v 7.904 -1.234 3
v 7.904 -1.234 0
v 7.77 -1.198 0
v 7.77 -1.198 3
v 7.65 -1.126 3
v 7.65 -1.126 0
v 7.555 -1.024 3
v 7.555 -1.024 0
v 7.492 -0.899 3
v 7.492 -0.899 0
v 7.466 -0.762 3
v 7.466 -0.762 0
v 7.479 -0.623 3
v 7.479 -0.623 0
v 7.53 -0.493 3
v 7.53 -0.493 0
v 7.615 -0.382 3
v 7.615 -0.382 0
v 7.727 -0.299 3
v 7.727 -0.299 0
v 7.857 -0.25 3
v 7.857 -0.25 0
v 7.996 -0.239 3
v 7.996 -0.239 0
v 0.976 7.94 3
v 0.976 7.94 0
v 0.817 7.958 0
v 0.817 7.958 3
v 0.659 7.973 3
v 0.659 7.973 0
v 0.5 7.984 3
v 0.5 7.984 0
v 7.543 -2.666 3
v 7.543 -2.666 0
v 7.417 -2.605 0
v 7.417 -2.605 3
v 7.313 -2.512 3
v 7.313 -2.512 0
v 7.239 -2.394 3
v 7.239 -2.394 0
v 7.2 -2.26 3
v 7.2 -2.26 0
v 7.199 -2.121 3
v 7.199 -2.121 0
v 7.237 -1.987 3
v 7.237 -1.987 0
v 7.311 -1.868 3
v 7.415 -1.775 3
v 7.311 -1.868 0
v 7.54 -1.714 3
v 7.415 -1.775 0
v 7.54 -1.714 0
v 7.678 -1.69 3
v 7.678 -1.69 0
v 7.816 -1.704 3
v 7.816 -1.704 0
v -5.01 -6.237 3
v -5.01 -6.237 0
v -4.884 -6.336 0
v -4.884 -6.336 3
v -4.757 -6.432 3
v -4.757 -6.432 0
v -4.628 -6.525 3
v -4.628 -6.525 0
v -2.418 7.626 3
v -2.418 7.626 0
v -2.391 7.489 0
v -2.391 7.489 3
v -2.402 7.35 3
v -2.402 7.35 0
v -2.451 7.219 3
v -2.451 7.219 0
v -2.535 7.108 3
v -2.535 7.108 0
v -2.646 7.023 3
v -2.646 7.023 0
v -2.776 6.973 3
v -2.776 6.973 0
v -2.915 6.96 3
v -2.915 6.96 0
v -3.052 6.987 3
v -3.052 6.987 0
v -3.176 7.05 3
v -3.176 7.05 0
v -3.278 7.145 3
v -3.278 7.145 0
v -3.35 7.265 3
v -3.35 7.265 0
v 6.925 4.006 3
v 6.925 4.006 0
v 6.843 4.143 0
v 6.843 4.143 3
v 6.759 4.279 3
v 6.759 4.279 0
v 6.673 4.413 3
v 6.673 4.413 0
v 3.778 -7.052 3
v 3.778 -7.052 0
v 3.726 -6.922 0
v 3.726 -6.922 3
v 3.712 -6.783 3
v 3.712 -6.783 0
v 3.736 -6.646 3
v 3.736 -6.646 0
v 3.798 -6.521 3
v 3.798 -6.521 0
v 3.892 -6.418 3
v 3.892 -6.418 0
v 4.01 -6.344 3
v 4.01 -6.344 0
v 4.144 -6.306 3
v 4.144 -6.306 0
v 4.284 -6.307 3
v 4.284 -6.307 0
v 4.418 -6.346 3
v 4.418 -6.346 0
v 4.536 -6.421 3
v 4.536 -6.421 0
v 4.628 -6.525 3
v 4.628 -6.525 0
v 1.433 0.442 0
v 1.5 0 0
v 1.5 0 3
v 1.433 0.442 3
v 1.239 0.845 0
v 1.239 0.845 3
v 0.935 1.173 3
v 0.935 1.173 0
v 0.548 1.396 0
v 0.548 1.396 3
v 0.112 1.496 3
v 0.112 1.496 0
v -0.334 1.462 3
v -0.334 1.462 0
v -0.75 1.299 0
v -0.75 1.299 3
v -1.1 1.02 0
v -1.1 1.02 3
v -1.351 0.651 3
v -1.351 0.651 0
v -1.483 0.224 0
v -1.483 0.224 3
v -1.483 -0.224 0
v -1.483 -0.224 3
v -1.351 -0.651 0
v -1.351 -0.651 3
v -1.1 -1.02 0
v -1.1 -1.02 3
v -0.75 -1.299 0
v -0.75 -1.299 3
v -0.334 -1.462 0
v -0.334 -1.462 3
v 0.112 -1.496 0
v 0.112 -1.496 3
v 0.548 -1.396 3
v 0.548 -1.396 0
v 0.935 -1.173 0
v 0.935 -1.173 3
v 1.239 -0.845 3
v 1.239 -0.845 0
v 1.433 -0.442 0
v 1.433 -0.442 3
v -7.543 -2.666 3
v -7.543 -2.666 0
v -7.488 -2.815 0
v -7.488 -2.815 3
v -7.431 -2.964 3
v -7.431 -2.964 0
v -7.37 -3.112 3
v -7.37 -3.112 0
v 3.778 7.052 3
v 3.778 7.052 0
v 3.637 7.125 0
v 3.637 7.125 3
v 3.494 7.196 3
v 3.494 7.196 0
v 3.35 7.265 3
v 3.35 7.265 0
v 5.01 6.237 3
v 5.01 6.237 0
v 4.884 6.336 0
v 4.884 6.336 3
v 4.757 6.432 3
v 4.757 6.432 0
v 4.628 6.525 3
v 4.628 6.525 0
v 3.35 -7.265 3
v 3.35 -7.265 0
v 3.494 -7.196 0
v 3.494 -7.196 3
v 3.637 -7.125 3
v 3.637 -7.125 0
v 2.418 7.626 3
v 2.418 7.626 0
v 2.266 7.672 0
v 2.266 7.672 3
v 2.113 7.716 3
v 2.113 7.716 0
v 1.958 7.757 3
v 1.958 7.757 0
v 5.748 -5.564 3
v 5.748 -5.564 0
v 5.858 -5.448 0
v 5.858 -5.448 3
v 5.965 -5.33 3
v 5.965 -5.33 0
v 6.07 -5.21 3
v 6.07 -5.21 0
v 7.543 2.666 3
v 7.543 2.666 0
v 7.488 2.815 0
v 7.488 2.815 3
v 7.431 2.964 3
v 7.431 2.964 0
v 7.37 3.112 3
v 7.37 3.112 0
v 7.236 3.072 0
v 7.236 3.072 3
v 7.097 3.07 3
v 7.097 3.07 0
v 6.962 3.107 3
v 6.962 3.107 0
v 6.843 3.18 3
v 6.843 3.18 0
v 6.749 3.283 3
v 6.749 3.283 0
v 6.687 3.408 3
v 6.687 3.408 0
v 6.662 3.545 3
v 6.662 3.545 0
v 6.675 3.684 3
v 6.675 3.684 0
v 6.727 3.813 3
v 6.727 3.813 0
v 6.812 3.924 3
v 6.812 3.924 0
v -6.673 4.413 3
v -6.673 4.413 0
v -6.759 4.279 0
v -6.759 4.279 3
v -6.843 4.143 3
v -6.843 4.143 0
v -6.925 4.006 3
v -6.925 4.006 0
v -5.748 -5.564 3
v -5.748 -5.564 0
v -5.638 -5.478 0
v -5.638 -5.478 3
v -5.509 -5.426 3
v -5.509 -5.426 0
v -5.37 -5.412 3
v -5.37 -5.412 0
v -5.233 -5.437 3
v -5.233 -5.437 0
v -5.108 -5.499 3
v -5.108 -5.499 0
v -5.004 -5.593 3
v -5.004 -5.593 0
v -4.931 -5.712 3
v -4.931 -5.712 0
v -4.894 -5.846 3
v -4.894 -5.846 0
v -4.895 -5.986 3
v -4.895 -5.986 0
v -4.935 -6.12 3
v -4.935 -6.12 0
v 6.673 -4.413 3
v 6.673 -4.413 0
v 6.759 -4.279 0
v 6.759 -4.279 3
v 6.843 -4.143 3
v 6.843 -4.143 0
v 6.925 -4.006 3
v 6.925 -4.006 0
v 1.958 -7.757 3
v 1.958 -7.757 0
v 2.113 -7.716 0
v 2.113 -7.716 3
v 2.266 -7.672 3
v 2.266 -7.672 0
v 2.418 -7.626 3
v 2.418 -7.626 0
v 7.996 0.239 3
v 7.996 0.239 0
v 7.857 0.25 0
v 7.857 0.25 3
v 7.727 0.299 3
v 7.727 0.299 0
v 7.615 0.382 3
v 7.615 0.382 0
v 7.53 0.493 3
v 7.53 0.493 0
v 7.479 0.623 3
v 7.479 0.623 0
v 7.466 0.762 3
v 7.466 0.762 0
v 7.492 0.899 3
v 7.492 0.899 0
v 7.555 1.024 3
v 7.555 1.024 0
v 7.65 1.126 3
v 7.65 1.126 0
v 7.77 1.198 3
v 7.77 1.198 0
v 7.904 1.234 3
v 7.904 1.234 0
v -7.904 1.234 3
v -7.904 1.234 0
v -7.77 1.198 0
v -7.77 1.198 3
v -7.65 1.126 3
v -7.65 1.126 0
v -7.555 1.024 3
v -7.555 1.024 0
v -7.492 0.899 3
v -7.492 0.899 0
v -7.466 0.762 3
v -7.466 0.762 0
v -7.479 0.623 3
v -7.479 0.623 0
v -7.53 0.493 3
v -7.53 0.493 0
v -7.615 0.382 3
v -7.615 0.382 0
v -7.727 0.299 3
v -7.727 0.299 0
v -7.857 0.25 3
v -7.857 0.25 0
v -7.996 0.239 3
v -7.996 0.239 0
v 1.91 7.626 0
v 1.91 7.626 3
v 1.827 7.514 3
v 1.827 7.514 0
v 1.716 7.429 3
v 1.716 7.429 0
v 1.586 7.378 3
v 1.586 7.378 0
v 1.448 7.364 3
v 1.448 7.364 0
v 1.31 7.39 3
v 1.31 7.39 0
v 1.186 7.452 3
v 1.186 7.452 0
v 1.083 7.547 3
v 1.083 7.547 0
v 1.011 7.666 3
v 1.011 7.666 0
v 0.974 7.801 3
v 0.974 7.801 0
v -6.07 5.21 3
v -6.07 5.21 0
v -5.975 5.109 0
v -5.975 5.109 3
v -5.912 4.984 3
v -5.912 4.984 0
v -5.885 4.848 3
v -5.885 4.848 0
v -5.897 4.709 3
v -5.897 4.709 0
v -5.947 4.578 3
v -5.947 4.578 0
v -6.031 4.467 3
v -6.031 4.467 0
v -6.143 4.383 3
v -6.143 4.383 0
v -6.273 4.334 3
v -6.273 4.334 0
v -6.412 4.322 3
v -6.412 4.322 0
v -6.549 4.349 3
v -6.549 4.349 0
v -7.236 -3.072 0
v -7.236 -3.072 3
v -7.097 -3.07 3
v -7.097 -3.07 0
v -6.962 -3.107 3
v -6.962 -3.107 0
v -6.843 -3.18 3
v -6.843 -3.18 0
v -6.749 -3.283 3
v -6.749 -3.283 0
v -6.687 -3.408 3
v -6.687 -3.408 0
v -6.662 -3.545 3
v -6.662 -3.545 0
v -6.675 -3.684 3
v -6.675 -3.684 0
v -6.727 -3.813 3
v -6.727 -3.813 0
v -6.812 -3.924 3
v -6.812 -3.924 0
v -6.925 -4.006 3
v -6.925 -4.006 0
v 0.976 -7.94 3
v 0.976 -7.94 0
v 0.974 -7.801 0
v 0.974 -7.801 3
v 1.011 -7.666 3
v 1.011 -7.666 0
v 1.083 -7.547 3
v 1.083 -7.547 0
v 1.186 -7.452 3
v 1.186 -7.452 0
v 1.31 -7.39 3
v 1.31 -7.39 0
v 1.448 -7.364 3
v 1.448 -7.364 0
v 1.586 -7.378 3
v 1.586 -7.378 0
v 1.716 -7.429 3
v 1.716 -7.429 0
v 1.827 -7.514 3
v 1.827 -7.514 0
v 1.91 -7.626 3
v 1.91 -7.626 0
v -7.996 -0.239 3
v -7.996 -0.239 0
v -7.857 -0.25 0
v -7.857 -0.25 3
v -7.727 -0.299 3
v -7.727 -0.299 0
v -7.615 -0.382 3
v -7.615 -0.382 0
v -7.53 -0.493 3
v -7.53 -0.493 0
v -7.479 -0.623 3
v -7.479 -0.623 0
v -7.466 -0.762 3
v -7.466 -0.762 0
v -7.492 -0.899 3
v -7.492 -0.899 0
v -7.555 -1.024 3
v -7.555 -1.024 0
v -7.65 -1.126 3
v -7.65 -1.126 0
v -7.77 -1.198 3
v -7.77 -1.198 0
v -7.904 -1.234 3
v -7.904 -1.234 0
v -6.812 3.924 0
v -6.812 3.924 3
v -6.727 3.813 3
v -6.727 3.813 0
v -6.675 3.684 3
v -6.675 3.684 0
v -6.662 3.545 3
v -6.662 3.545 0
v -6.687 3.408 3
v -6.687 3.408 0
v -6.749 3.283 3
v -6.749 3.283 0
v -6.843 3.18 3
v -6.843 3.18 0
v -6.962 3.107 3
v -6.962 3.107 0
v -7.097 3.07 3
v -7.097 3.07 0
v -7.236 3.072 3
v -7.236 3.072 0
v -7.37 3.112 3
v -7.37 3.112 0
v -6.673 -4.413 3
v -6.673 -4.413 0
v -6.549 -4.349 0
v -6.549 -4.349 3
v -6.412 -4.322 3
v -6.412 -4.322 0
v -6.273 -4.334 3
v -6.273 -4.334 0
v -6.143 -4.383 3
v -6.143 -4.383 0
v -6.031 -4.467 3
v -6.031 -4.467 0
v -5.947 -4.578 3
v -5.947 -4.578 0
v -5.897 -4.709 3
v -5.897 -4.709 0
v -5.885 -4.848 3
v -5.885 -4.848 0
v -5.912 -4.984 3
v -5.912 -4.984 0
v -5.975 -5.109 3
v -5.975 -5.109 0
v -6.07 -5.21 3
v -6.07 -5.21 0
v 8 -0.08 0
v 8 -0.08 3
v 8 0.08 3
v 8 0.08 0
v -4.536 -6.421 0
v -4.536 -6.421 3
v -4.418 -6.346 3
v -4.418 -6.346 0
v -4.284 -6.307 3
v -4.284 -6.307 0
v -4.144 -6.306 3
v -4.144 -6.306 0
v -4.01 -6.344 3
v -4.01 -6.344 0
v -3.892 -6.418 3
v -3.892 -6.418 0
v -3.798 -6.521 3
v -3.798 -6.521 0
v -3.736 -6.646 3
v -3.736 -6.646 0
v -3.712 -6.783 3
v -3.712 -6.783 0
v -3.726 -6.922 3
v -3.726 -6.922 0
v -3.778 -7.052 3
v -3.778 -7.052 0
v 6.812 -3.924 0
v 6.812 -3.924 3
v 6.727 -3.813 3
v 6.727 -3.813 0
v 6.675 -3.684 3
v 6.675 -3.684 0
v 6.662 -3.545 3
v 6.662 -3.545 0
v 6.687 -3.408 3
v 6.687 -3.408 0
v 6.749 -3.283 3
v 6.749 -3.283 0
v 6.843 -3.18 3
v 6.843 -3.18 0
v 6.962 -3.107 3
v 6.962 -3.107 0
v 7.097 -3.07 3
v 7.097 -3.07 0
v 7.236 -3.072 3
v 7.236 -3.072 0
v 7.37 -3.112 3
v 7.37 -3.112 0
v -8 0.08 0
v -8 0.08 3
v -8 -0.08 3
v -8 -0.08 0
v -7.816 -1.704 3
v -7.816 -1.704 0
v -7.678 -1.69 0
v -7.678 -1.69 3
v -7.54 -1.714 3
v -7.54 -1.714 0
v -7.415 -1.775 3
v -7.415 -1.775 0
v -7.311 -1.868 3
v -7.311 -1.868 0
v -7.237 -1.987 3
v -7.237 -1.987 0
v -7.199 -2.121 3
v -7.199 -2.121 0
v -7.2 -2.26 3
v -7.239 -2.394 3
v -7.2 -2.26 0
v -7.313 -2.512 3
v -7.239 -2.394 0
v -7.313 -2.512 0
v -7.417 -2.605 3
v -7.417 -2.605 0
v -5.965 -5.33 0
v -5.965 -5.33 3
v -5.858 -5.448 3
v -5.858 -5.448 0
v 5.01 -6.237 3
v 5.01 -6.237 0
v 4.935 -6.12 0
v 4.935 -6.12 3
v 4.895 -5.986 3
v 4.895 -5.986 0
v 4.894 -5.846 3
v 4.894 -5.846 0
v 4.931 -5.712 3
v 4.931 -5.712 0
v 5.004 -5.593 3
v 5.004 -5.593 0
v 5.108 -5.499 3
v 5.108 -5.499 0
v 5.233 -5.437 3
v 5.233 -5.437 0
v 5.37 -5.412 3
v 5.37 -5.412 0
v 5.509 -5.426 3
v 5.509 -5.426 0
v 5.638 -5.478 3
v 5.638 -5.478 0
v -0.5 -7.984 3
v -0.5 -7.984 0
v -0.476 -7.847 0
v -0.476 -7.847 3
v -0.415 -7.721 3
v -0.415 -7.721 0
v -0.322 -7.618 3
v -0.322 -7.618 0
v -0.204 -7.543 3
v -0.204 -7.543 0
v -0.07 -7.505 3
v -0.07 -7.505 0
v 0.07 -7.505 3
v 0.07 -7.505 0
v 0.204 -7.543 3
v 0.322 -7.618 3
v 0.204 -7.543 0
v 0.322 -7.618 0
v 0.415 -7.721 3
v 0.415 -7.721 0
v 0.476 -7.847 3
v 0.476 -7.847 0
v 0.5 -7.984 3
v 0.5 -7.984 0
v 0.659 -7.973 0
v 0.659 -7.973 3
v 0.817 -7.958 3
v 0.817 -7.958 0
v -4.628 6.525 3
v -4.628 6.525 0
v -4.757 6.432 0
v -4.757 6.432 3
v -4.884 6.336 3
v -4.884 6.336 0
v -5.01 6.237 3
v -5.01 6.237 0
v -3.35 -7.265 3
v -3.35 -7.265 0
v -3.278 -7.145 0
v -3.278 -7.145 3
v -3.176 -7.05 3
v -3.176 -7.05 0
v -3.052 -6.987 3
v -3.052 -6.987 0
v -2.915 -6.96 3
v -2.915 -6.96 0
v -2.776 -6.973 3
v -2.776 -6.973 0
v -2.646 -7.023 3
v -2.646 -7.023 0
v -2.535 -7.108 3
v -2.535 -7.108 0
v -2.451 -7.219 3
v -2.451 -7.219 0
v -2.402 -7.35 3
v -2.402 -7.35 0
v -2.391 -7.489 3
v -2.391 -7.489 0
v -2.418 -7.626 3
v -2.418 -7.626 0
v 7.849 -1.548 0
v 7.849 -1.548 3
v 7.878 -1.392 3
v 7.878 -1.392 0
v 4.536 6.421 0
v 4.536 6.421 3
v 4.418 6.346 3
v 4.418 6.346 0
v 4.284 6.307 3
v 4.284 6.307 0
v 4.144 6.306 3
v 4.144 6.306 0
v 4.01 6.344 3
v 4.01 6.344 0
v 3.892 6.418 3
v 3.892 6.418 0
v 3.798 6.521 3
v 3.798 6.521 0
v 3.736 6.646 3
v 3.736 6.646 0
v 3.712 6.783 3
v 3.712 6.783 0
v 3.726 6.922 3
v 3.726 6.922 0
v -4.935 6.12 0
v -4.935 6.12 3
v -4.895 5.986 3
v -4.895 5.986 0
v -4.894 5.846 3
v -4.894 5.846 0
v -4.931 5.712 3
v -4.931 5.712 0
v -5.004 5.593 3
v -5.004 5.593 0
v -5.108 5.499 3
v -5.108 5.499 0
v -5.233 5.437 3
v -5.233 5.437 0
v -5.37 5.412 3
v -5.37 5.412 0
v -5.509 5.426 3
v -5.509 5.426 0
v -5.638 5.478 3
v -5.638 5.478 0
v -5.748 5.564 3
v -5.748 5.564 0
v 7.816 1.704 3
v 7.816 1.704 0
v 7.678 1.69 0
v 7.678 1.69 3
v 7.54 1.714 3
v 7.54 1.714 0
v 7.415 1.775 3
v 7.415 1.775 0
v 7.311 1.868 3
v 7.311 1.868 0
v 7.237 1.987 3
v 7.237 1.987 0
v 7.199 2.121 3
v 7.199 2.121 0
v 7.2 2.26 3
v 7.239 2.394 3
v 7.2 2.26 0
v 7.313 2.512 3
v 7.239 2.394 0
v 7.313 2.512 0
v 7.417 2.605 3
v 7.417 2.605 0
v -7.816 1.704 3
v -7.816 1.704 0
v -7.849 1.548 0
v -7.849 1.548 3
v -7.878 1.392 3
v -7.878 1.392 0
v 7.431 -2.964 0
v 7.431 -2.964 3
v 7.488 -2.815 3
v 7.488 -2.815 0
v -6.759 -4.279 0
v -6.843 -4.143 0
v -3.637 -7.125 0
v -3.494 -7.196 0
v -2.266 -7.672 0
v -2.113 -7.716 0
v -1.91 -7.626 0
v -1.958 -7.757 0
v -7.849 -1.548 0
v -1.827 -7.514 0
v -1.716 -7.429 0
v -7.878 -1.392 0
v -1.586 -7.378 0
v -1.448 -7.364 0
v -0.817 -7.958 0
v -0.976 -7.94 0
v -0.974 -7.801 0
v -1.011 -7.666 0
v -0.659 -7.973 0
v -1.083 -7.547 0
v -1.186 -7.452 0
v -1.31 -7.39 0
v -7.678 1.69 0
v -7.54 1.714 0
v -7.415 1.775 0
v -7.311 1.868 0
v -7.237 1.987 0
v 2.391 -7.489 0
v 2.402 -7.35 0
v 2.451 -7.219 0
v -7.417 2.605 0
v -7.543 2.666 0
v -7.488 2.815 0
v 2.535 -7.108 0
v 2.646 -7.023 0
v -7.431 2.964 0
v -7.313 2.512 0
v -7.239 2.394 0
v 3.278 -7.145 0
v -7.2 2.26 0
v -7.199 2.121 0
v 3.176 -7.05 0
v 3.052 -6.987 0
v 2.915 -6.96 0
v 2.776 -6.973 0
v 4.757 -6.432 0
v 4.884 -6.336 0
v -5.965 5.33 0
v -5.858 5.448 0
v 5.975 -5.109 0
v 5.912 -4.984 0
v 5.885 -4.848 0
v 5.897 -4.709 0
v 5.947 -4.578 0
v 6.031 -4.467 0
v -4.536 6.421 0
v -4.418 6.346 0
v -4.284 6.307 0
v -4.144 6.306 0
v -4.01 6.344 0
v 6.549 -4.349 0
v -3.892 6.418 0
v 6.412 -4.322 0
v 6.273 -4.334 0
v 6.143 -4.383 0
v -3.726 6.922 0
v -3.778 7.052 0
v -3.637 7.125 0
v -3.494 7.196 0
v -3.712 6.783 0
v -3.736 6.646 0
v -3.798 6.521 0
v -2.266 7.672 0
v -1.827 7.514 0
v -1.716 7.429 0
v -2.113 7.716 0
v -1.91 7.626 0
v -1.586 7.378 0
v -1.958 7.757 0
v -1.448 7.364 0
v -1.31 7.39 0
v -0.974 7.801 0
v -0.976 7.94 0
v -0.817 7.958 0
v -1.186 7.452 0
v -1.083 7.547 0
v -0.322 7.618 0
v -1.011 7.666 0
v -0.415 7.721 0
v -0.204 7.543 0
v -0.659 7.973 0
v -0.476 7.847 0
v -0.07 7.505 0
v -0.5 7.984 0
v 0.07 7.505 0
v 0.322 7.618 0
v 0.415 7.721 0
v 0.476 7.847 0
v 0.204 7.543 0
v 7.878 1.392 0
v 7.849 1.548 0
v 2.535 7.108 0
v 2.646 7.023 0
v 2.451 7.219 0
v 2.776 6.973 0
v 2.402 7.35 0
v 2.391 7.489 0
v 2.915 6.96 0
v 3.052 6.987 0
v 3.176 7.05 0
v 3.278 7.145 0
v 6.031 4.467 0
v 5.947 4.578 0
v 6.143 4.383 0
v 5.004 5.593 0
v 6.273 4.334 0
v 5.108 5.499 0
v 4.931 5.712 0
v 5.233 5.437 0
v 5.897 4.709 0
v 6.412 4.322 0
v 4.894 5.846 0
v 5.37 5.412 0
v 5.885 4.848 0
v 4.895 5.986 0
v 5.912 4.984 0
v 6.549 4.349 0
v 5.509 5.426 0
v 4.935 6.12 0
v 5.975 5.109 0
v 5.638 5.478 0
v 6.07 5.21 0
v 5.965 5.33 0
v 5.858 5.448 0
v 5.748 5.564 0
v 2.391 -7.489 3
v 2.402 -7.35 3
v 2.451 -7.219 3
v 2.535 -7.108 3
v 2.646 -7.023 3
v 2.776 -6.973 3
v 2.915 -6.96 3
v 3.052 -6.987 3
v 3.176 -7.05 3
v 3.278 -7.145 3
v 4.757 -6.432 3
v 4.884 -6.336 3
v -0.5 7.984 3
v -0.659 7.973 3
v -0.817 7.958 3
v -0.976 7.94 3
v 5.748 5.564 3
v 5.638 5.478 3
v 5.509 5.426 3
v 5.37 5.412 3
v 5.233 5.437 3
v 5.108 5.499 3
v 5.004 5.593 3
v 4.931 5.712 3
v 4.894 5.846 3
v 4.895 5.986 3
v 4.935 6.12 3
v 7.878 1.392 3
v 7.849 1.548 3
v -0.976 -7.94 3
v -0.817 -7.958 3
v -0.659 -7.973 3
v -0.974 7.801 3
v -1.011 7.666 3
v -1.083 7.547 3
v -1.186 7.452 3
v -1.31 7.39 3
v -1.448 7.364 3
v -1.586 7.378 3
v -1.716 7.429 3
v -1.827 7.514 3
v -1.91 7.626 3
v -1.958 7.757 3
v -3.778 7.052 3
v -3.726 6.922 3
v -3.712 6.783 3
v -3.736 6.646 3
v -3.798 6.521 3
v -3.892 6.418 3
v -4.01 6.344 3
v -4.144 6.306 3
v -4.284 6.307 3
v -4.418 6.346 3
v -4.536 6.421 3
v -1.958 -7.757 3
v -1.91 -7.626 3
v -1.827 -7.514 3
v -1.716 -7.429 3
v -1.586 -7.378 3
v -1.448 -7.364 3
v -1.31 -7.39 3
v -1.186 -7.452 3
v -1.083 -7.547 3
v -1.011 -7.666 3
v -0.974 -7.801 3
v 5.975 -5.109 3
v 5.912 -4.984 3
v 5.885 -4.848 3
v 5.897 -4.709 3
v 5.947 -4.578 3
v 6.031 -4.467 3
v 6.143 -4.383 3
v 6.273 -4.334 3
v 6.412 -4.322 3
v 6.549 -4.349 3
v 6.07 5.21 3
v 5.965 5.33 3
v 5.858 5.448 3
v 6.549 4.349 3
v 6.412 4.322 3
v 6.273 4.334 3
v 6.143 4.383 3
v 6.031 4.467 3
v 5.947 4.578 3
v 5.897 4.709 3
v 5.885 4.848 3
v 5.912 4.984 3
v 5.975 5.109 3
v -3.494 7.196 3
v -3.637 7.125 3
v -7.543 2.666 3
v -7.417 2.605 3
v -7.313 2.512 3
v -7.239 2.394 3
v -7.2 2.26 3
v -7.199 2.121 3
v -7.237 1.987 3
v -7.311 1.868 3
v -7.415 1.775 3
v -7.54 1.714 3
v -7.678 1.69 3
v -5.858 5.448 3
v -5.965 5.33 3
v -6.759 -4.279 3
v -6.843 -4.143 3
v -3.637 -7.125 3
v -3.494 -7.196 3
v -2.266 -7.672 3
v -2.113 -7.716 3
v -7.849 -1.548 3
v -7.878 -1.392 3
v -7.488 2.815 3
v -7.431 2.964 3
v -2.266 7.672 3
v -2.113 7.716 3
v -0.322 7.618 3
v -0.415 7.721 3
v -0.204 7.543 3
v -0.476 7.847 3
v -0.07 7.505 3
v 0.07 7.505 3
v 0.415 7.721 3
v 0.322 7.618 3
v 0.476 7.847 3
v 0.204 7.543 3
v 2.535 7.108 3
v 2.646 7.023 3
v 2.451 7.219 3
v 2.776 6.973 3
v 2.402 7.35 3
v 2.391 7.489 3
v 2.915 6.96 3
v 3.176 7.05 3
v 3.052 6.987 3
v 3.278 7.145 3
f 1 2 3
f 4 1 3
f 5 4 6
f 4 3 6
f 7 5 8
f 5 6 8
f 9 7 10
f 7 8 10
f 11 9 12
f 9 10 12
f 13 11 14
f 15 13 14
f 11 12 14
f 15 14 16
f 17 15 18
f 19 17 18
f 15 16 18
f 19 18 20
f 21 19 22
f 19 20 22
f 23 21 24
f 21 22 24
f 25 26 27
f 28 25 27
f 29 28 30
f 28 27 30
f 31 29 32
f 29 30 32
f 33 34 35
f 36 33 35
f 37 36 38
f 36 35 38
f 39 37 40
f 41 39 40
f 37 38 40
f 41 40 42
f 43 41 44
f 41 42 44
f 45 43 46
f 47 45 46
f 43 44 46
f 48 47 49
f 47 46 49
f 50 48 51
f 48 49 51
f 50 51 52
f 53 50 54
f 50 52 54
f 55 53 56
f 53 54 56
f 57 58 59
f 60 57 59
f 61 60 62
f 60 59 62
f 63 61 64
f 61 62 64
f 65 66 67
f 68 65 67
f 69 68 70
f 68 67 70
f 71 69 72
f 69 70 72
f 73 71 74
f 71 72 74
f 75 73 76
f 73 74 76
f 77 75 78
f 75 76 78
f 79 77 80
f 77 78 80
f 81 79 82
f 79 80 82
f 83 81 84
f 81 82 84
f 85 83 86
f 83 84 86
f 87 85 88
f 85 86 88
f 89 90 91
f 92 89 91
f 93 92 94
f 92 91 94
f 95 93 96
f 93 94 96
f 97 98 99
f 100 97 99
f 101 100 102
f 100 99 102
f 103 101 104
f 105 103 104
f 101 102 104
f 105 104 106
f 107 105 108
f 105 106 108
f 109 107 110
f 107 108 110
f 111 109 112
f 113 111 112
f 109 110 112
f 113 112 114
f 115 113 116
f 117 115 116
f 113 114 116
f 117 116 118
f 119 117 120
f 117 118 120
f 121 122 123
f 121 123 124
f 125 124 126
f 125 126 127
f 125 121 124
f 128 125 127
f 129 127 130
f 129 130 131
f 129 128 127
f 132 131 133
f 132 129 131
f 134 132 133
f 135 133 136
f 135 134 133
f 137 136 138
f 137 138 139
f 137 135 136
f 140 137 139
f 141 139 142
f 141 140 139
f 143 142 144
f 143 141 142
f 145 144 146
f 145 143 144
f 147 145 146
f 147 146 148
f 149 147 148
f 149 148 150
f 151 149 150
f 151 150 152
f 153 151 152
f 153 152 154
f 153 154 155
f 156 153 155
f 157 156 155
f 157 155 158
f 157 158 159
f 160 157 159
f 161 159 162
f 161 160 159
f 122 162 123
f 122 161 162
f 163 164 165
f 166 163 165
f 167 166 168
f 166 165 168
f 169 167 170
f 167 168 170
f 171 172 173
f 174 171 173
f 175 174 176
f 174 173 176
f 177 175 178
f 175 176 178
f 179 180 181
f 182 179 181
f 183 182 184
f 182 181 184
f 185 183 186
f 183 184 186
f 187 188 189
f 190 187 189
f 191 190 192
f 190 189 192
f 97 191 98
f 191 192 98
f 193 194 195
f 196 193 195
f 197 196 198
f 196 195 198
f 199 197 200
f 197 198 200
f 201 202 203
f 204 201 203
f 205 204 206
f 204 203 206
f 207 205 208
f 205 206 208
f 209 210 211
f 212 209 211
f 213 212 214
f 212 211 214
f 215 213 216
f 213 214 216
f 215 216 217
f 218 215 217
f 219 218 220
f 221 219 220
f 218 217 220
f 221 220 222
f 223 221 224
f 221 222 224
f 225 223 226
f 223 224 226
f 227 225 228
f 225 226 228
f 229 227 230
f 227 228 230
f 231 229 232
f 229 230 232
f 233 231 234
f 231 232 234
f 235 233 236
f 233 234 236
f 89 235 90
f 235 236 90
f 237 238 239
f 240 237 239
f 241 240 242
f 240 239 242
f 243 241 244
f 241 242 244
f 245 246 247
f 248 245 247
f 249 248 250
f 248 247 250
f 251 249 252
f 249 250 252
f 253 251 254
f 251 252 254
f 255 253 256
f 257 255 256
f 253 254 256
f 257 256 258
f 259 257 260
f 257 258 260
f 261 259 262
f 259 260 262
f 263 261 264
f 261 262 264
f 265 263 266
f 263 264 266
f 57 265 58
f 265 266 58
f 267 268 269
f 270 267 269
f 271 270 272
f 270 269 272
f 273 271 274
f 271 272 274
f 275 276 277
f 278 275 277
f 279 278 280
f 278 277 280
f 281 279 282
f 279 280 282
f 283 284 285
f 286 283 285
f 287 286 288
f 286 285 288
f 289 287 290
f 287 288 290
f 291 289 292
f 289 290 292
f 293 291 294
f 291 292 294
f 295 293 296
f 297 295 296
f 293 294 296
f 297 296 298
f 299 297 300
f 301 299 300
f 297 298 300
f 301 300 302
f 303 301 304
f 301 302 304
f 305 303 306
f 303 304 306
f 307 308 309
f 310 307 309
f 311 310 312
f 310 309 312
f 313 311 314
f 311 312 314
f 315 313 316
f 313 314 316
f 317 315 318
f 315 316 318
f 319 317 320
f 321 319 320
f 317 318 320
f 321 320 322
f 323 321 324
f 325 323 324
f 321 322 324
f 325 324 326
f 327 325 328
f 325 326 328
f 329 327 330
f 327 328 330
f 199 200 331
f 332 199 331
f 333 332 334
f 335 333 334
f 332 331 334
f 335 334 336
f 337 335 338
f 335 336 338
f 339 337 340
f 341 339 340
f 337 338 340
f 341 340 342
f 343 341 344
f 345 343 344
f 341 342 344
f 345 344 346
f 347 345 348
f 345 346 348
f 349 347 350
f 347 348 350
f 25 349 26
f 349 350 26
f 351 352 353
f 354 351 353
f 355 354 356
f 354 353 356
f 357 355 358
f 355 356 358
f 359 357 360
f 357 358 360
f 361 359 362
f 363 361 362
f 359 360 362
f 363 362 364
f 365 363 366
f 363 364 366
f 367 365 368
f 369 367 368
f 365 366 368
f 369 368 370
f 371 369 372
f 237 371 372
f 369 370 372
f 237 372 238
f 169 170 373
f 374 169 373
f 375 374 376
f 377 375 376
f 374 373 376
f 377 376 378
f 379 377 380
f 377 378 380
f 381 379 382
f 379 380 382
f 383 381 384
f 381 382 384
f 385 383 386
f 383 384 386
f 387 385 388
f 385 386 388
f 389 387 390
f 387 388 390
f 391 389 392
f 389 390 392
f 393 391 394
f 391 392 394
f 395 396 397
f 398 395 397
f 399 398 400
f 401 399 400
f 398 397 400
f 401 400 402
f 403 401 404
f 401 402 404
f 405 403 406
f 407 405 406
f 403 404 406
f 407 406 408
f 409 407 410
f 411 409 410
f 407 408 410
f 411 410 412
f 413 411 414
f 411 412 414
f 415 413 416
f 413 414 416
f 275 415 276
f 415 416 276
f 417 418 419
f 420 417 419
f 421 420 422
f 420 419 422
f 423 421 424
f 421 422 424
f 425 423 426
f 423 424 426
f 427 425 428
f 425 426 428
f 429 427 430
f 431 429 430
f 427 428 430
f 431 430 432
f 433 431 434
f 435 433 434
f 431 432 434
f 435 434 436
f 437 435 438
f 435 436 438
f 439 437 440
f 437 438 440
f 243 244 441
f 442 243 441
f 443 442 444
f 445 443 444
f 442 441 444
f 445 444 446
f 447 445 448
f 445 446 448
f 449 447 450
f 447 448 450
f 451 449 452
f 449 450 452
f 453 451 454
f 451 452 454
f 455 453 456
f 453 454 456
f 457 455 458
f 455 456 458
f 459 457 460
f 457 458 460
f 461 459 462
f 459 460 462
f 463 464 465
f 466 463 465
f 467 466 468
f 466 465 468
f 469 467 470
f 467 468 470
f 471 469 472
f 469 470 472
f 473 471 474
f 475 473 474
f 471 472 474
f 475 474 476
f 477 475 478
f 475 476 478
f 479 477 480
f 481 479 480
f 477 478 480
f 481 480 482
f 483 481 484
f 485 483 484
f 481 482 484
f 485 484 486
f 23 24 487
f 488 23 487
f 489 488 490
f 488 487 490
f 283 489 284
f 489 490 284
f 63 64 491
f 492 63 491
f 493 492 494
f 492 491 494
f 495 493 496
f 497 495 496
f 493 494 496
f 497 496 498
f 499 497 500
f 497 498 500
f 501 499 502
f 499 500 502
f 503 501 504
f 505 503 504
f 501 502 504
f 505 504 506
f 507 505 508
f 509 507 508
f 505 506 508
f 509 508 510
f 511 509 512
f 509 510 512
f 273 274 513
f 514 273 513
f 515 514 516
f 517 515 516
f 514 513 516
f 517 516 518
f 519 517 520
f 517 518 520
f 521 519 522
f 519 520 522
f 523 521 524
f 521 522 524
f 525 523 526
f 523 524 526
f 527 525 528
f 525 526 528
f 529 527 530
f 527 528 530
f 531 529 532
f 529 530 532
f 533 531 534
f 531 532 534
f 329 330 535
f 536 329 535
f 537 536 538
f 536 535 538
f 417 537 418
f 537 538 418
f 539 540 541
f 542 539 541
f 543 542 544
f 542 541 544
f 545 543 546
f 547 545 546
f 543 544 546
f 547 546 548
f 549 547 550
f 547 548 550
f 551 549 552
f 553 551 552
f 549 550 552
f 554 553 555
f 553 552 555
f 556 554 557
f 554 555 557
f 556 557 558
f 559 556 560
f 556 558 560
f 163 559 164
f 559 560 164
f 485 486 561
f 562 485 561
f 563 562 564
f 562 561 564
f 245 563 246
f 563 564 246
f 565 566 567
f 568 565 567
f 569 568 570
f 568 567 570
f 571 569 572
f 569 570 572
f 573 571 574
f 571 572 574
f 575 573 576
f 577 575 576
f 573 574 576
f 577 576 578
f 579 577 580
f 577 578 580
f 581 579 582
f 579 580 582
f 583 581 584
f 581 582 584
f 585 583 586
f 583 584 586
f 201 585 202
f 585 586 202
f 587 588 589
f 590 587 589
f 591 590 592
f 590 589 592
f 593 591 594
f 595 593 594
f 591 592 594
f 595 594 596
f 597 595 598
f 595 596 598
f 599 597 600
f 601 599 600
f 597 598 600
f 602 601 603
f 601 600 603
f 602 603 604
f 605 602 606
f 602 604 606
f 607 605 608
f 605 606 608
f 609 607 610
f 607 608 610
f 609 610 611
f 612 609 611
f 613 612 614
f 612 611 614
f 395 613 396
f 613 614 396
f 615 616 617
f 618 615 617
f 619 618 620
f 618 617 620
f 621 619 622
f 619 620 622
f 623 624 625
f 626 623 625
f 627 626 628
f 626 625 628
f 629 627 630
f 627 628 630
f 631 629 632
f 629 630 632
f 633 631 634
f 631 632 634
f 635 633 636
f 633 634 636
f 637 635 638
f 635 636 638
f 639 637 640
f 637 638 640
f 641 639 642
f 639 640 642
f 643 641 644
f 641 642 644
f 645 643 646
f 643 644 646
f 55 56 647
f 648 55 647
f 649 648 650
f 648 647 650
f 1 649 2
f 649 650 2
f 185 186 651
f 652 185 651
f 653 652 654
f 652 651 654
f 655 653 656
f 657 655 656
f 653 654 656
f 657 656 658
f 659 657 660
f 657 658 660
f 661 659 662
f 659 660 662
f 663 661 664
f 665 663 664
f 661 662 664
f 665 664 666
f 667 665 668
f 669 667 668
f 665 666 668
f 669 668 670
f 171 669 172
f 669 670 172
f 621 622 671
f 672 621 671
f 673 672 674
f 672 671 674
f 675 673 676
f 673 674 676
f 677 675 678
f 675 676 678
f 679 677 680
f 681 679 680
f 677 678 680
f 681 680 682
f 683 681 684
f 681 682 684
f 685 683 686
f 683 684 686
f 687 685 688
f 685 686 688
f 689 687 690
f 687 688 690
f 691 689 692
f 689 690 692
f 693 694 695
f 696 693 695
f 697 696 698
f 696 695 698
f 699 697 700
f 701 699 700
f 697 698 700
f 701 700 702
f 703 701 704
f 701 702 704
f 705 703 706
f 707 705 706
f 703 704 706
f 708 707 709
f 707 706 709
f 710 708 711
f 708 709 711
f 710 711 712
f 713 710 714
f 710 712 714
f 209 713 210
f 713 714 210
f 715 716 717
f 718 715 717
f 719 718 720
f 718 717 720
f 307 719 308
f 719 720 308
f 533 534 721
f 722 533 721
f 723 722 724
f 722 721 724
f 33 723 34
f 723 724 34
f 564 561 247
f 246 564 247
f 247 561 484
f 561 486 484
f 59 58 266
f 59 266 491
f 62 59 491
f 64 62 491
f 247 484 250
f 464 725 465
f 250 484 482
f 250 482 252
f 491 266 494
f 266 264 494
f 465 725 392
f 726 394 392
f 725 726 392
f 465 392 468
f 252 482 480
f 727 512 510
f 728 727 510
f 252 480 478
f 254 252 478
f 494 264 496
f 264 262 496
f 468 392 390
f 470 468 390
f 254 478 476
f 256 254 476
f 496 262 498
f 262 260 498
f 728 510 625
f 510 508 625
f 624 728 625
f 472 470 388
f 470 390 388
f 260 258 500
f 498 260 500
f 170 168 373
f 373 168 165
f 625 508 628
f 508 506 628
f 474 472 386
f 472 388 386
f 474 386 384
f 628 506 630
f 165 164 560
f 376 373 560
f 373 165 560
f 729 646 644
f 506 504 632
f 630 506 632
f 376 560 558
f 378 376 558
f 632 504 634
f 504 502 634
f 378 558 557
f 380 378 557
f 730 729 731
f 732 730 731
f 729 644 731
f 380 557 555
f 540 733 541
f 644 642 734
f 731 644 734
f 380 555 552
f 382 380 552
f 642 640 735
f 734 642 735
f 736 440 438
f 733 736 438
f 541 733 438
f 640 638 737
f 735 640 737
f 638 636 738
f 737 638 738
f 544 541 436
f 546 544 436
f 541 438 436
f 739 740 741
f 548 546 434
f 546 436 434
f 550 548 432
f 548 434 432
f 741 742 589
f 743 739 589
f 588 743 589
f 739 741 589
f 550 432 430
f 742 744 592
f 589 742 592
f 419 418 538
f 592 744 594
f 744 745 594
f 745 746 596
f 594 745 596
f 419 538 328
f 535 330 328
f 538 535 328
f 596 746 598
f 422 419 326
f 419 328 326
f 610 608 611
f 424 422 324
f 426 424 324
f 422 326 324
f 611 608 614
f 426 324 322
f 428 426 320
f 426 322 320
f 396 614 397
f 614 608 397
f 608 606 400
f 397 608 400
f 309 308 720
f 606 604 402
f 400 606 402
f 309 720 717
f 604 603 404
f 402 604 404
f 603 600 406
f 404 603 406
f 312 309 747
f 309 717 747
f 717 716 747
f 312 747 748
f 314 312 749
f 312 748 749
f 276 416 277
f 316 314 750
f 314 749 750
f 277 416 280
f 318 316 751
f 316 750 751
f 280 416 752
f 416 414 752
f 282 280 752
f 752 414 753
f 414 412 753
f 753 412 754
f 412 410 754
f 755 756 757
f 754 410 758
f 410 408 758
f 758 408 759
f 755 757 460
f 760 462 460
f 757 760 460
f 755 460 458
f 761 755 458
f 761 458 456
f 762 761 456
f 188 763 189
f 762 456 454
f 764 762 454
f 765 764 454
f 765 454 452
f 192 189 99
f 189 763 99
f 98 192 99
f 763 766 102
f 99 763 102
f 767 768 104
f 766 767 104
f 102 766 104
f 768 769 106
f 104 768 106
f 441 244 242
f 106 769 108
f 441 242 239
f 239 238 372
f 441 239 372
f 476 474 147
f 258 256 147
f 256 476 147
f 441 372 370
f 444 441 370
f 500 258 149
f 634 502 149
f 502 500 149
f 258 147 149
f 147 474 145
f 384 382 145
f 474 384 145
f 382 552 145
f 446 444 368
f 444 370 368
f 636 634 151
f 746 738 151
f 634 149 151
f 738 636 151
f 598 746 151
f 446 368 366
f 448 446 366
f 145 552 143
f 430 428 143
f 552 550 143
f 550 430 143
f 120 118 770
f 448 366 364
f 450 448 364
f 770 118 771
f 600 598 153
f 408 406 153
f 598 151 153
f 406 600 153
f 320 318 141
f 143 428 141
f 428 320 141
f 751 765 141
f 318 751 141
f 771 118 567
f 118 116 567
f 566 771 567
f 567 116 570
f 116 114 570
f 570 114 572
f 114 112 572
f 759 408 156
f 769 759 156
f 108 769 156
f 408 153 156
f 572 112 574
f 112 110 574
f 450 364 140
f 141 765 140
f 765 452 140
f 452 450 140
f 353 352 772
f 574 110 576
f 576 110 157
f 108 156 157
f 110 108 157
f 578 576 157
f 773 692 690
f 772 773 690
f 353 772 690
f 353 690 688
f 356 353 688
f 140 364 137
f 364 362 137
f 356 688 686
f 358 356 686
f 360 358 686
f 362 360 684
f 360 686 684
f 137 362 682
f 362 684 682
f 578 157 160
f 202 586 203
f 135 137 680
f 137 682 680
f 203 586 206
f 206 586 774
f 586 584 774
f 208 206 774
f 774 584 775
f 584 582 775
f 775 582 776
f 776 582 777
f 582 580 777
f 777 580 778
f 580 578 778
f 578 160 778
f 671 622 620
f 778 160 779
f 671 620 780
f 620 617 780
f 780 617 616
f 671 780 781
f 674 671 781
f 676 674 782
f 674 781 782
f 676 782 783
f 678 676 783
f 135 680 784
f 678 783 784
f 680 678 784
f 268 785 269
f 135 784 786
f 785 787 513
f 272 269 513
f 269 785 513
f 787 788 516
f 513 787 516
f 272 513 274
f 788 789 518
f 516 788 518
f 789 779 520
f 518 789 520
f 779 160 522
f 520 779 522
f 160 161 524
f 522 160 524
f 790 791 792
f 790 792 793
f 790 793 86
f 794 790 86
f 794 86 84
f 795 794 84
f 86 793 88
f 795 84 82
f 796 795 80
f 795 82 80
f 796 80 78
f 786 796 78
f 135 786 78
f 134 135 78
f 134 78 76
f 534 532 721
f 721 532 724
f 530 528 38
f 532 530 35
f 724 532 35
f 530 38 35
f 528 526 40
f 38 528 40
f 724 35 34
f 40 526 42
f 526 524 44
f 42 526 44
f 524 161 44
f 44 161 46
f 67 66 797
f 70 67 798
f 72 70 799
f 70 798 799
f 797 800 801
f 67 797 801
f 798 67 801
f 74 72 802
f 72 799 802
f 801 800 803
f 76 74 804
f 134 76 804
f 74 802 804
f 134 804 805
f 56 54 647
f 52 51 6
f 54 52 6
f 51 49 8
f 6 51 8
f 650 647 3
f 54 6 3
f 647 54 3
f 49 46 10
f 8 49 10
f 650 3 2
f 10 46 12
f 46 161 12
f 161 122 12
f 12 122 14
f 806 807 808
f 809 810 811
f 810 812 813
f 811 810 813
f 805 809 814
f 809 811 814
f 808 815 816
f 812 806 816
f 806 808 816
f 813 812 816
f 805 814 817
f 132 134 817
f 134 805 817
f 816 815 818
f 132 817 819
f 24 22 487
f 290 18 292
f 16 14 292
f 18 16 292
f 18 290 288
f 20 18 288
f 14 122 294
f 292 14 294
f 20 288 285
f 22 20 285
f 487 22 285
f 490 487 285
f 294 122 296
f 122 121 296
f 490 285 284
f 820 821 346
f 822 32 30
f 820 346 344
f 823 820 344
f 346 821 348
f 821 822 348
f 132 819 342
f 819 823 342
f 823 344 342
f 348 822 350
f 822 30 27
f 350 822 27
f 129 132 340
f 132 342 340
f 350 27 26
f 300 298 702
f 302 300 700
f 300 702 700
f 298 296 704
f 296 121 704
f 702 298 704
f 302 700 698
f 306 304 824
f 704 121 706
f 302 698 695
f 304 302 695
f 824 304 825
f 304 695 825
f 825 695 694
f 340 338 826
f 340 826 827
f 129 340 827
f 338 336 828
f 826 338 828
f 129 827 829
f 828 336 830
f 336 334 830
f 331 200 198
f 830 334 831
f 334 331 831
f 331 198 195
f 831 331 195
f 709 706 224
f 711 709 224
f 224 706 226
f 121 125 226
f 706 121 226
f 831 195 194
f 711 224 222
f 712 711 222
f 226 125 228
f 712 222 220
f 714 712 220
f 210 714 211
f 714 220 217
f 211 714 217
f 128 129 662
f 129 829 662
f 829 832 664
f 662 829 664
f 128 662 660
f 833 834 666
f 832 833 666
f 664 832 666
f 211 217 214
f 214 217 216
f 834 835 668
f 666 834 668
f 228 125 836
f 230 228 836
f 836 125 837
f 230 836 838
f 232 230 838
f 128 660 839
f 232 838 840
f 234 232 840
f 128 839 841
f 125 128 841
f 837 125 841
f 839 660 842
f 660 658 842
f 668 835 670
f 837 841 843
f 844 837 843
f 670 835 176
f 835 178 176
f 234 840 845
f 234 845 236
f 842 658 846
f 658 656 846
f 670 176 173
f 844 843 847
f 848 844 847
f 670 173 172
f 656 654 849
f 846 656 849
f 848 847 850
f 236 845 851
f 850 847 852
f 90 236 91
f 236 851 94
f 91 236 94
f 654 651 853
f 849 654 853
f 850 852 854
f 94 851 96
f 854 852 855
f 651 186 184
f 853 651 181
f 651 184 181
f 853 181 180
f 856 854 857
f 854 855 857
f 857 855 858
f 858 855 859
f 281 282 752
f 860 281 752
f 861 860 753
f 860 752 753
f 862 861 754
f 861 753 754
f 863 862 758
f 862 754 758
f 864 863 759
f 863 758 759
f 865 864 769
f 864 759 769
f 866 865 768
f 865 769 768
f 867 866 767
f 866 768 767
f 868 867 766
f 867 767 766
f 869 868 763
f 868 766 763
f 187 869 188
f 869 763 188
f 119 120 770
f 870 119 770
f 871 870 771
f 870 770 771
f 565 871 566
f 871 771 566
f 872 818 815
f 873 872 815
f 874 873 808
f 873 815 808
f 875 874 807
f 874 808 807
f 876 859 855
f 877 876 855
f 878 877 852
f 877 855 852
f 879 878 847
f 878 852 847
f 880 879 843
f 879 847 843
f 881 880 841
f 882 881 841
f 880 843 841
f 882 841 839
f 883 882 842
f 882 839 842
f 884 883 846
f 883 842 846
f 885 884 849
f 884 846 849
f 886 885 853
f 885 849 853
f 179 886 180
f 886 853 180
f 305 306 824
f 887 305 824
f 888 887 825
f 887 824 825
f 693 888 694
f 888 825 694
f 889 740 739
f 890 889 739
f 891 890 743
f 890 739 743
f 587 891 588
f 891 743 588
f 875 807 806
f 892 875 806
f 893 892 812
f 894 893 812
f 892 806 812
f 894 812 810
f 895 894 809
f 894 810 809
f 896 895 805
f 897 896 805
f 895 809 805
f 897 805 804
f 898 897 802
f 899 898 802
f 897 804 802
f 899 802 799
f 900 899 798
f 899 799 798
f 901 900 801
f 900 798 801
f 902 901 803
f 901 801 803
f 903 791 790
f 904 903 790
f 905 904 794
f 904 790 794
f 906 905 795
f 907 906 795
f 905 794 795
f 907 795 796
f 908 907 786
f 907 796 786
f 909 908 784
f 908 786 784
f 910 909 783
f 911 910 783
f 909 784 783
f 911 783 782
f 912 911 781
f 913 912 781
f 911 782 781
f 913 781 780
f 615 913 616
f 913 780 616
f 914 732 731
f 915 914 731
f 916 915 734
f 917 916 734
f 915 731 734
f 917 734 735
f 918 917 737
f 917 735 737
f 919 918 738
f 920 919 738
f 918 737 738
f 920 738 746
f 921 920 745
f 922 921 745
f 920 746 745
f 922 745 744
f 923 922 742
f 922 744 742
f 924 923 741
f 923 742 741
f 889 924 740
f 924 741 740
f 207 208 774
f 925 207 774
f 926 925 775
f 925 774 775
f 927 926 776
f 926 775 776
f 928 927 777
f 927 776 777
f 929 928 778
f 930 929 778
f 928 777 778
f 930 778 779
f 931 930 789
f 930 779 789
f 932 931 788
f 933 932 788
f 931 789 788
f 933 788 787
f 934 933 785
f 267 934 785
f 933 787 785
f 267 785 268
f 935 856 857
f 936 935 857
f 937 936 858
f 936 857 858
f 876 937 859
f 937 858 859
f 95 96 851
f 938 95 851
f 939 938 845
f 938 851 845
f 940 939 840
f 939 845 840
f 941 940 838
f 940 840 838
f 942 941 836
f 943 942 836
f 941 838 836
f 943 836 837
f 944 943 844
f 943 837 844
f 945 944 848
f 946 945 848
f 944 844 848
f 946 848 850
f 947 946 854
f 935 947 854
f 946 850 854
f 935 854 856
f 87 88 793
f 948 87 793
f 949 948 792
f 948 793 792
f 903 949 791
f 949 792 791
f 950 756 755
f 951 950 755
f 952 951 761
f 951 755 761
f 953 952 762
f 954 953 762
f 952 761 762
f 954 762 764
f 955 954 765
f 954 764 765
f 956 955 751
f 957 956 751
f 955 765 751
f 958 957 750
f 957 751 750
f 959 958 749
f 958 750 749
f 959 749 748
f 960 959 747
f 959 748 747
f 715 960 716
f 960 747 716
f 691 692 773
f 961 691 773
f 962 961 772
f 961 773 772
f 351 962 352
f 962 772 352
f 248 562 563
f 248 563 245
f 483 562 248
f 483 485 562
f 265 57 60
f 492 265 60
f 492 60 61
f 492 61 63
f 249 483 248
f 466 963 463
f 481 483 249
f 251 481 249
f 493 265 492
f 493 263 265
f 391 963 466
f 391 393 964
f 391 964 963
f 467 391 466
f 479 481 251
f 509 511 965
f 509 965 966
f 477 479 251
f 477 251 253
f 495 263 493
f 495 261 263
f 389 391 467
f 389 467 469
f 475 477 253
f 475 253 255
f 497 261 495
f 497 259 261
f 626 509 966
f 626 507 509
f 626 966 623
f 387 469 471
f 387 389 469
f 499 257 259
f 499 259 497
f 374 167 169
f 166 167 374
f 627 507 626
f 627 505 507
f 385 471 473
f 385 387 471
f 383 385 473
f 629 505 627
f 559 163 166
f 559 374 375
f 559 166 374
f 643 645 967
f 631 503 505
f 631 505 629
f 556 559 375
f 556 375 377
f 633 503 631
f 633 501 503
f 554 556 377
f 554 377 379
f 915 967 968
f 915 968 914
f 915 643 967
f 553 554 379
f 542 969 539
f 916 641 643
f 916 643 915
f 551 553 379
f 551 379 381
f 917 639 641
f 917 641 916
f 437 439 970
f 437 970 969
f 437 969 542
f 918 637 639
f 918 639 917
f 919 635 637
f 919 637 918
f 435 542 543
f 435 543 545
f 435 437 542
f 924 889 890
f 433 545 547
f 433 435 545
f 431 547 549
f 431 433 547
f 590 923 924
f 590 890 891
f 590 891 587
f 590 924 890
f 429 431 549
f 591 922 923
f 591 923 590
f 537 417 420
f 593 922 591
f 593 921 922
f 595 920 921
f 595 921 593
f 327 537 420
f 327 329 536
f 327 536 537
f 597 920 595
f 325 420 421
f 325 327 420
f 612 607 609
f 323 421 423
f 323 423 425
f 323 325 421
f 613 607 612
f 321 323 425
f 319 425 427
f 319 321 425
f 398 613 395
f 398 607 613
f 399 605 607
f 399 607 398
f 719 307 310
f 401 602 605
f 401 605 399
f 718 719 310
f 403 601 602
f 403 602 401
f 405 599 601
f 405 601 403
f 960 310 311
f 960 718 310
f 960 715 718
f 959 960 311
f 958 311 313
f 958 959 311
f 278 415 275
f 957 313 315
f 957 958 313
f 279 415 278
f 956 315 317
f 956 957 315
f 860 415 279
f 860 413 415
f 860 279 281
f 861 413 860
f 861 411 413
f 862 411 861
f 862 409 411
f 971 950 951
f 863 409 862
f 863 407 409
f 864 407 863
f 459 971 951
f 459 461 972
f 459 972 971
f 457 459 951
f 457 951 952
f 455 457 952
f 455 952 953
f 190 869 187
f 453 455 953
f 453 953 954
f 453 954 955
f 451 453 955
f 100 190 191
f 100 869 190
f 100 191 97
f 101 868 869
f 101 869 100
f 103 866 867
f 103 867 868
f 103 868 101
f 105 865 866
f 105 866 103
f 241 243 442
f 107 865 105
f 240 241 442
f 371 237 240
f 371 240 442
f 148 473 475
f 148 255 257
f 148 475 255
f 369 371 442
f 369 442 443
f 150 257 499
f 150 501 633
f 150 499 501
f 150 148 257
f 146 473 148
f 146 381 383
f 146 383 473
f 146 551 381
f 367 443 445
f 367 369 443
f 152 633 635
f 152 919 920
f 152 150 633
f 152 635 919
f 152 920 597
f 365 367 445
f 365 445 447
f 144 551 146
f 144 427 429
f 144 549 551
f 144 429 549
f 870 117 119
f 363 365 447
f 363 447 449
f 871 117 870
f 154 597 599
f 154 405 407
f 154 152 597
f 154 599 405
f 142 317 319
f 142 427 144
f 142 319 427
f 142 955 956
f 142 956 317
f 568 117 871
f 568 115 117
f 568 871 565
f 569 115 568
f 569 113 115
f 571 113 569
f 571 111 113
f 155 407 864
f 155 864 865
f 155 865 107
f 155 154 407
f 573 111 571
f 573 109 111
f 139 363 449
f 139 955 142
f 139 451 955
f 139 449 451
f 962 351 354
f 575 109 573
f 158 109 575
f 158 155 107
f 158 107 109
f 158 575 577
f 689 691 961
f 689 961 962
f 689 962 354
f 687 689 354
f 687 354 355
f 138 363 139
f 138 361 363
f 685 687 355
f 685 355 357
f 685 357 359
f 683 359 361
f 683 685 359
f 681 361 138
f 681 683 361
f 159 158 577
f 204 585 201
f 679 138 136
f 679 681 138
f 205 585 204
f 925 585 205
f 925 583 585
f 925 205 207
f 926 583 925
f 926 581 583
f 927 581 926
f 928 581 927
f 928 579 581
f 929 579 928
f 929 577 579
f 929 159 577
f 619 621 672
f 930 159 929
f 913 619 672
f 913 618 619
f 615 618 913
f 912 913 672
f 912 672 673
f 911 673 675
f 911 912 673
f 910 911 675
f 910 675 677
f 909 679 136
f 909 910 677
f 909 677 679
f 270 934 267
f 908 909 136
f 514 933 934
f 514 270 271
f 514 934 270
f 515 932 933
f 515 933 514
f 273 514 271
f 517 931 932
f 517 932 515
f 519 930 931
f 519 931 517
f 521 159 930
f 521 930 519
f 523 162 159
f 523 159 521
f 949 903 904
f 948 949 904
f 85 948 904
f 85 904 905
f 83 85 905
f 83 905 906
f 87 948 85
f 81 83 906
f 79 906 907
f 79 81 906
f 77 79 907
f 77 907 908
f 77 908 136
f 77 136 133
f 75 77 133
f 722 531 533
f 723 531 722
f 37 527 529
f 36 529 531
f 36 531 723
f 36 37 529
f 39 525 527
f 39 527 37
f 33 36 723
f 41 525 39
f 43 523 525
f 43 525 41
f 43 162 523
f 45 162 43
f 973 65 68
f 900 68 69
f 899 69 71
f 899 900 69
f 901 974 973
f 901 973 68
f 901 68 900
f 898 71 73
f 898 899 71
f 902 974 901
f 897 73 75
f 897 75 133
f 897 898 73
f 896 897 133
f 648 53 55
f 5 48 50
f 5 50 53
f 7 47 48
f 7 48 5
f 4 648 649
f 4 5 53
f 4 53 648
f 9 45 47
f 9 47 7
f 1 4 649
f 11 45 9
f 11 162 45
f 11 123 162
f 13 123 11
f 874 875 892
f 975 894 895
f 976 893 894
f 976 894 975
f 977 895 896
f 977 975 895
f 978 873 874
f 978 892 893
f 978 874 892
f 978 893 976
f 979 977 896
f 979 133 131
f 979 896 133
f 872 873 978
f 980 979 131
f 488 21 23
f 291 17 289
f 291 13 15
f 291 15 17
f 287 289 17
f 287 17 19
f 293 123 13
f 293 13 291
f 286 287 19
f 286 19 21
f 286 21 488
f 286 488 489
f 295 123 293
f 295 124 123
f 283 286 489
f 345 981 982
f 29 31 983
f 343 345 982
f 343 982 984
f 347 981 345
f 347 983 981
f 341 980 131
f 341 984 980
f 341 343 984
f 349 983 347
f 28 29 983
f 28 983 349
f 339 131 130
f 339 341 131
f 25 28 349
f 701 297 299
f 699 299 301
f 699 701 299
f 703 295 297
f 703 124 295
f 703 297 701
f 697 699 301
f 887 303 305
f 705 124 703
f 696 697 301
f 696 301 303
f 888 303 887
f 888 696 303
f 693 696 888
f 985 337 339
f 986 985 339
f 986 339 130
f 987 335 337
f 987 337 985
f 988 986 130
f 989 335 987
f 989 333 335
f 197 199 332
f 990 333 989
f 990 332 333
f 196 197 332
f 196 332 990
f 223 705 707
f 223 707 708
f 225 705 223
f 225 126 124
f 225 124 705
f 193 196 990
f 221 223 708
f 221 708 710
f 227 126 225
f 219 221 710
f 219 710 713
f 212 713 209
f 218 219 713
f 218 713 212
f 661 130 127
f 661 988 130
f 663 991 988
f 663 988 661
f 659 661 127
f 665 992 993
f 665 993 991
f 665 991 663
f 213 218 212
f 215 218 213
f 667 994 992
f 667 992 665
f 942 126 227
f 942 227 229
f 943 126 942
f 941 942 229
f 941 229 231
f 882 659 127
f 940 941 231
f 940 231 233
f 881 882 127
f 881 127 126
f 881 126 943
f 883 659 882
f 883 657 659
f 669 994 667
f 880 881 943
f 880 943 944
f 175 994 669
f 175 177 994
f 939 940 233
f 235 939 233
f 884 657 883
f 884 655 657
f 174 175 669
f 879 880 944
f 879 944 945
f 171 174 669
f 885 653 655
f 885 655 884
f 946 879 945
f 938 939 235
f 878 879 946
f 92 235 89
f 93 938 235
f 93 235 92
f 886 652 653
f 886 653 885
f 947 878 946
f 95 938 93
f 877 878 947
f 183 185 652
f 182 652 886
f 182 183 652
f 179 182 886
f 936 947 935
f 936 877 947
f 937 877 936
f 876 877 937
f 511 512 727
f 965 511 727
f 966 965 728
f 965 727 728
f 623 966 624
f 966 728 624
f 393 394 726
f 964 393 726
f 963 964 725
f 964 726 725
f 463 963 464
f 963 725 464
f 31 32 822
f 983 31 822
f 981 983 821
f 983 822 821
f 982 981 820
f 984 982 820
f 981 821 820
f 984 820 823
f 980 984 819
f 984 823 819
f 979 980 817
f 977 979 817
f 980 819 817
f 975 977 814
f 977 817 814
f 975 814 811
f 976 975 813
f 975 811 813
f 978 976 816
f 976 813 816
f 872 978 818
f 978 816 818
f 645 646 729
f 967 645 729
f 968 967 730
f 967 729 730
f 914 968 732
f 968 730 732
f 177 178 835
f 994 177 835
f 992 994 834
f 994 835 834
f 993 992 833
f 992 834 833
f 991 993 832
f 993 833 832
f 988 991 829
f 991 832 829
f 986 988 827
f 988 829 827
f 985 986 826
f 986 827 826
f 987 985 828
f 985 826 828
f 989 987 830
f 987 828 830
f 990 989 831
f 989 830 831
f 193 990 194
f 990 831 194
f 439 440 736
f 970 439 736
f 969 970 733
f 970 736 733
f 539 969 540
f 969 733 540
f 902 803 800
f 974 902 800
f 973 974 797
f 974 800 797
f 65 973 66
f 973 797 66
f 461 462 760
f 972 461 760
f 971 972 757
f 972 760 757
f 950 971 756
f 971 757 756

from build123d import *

# Parameters (mm, degrees)
SKETCH1_R           = 1.5
BOSS_EXTRUDE1_DEPTH = 3


with BuildPart() as part:
    # Sketch1 → Boss-Extrude1 (new body)
    with BuildSketch(Plane.XY):
        with BuildLine():
            ThreePointArc((-0.4997558, 7.984375), (-0.738146876, 7.96587341), (-0.975878549, 7.94025573))
            ThreePointArc((-0.975878549, 7.94025573), (-1.378121384, 7.372298248), (-1.958371564, 7.756595956))
            ThreePointArc((-1.958371564, 7.756595956), (-2.189303921, 7.694605145), (-2.418280524, 7.625740574))
            ThreePointArc((-2.418280524, 7.625740574), (-2.709312496, 6.993541721), (-3.350297333, 7.264675339))
            ThreePointArc((-3.350297333, 7.264675339), (-3.565906846, 7.161306331), (-3.778330856, 7.05153997))
            ThreePointArc((-3.778330856, 7.05153997), (-3.948241222, 6.376628518), (-4.628132745, 6.525364917))
            ThreePointArc((-4.628132745, 6.525364917), (-4.821077091, 6.384137818), (-5.009714662, 6.237207629))
            ThreePointArc((-5.009714662, 6.237207629), (-5.052717327, 5.542566879), (-5.748362647, 5.563841018))
            ThreePointArc((-5.748362647, 5.563841018), (-5.912071338, 5.389565149), (-6.070498644, 5.210474662))
            ThreePointArc((-6.070498644, 5.210474662), (-5.985129205, 4.519759773), (-6.672838954, 4.412847187))
            ThreePointArc((-6.672838954, 4.412847187), (-6.801737086, 4.211457303), (-6.924559076, 4.006305231))
            ThreePointArc((-6.924559076, 4.006305231), (-6.713724685, 3.343037668), (-7.370079733, 3.111579138))
            ThreePointArc((-7.370079733, 3.111579138), (-7.459777835, 2.889933329), (-7.542811953, 2.66570588))
            ThreePointArc((-7.542811953, 2.66570588), (-7.213692324, 2.052472426), (-7.816341286, 1.704349993))
            ThreePointArc((-7.816341286, 1.704349993), (-7.863784797, 1.469996143), (-7.904203416, 1.234329112))
            ThreePointArc((-7.904203416, 1.234329112), (-7.468006322, 0.692012696), (-7.996426712, 0.239081253))
            ThreePointArc((-7.996426712, 0.239081253), (-8, 0), (-7.996426712, -0.239081253))
            ThreePointArc((-7.996426712, -0.239081253), (-7.468006322, -0.692012696), (-7.904203416, -1.234329112))
            ThreePointArc((-7.904203416, -1.234329112), (-7.863784797, -1.469996143), (-7.816341286, -1.704349993))
            ThreePointArc((-7.816341286, -1.704349993), (-7.213692324, -2.052472426), (-7.542811953, -2.66570588))
            ThreePointArc((-7.542811953, -2.66570588), (-7.459777835, -2.889933329), (-7.370079733, -3.111579138))
            ThreePointArc((-7.370079733, -3.111579138), (-6.713724685, -3.343037668), (-6.924559076, -4.006305231))
            ThreePointArc((-6.924559076, -4.006305231), (-6.801737086, -4.211457303), (-6.672838954, -4.412847187))
            ThreePointArc((-6.672838954, -4.412847187), (-5.985129205, -4.519759773), (-6.070498644, -5.210474662))
            ThreePointArc((-6.070498644, -5.210474662), (-5.912071338, -5.389565149), (-5.748362647, -5.563841018))
            ThreePointArc((-5.748362647, -5.563841018), (-5.052717327, -5.542566879), (-5.009714662, -6.237207629))
            ThreePointArc((-5.009714662, -6.237207629), (-4.821077091, -6.384137818), (-4.628132745, -6.525364917))
            ThreePointArc((-4.628132745, -6.525364917), (-3.948241222, -6.376628518), (-3.778330856, -7.05153997))
            ThreePointArc((-3.778330856, -7.05153997), (-3.565906846, -7.161306331), (-3.350297333, -7.264675339))
            ThreePointArc((-3.350297333, -7.264675339), (-2.709312496, -6.993541721), (-2.418280524, -7.625740574))
            ThreePointArc((-2.418280524, -7.625740574), (-2.189303921, -7.694605145), (-1.958371564, -7.756595956))
            ThreePointArc((-1.958371564, -7.756595956), (-1.378121384, -7.372298248), (-0.975878549, -7.94025573))
            ThreePointArc((-0.975878549, -7.94025573), (-0.738146876, -7.96587341), (-0.4997558, -7.984375))
            ThreePointArc((-0.4997558, -7.984375), (0, -7.5), (0.4997558, -7.984375))
            ThreePointArc((0.4997558, -7.984375), (0.738146876, -7.96587341), (0.975878549, -7.94025573))
            ThreePointArc((0.975878549, -7.94025573), (1.378121384, -7.372298248), (1.958371564, -7.756595956))
            ThreePointArc((1.958371564, -7.756595956), (2.189303921, -7.694605145), (2.418280524, -7.625740574))
            ThreePointArc((2.418280524, -7.625740574), (2.709312496, -6.993541721), (3.350297333, -7.264675339))
            ThreePointArc((3.350297333, -7.264675339), (3.565906846, -7.161306331), (3.778330856, -7.05153997))
            ThreePointArc((3.778330856, -7.05153997), (3.948241222, -6.376628518), (4.628132745, -6.525364917))
            ThreePointArc((4.628132745, -6.525364917), (4.821077091, -6.384137818), (5.009714662, -6.237207629))
            ThreePointArc((5.009714662, -6.237207629), (5.052717327, -5.542566879), (5.748362647, -5.563841018))
            ThreePointArc((5.748362647, -5.563841018), (5.912071338, -5.389565149), (6.070498644, -5.210474662))
            ThreePointArc((6.070498644, -5.210474662), (5.985129205, -4.519759773), (6.672838954, -4.412847187))
            ThreePointArc((6.672838954, -4.412847187), (6.801737086, -4.211457303), (6.924559076, -4.006305231))
            ThreePointArc((6.924559076, -4.006305231), (6.713724685, -3.343037668), (7.370079733, -3.111579138))
            ThreePointArc((7.370079733, -3.111579138), (7.459777835, -2.889933329), (7.542811953, -2.66570588))
            ThreePointArc((7.542811953, -2.66570588), (7.213692324, -2.052472426), (7.816341286, -1.704349993))
            ThreePointArc((7.816341286, -1.704349993), (7.863784797, -1.469996143), (7.904203416, -1.234329112))
            ThreePointArc((7.904203416, -1.234329112), (7.468006322, -0.692012696), (7.996426712, -0.239081253))
            ThreePointArc((7.996426712, -0.239081253), (8, 0), (7.996426712, 0.239081253))
            ThreePointArc((7.996426712, 0.239081253), (7.468006322, 0.692012696), (7.904203416, 1.234329112))
            ThreePointArc((7.904203416, 1.234329112), (7.863784797, 1.469996143), (7.816341286, 1.704349993))
            ThreePointArc((7.816341286, 1.704349993), (7.213692324, 2.052472426), (7.542811953, 2.66570588))
            ThreePointArc((7.542811953, 2.66570588), (7.459777835, 2.889933329), (7.370079733, 3.111579138))
            ThreePointArc((7.370079733, 3.111579138), (6.713724685, 3.343037668), (6.924559076, 4.006305231))
            ThreePointArc((6.924559076, 4.006305231), (6.801737086, 4.211457303), (6.672838954, 4.412847187))
            ThreePointArc((6.672838954, 4.412847187), (5.985129205, 4.519759773), (6.070498644, 5.210474662))
            ThreePointArc((6.070498644, 5.210474662), (5.912071338, 5.389565149), (5.748362647, 5.563841018))
            ThreePointArc((5.748362647, 5.563841018), (5.052717327, 5.542566879), (5.009714662, 6.237207629))
            ThreePointArc((5.009714662, 6.237207629), (4.821077091, 6.384137818), (4.628132745, 6.525364917))
            ThreePointArc((4.628132745, 6.525364917), (3.948241222, 6.376628518), (3.778330856, 7.05153997))
            ThreePointArc((3.778330856, 7.05153997), (3.565906846, 7.161306331), (3.350297333, 7.264675339))
            ThreePointArc((3.350297333, 7.264675339), (2.709312496, 6.993541721), (2.418280524, 7.625740574))
            ThreePointArc((2.418280524, 7.625740574), (2.189303921, 7.694605145), (1.958371564, 7.756595956))
            ThreePointArc((1.958371564, 7.756595956), (1.378121384, 7.372298248), (0.975878549, 7.94025573))
            ThreePointArc((0.975878549, 7.94025573), (0.738146876, 7.96587341), (0.4997558, 7.984375))
            ThreePointArc((0.4997558, 7.984375), (0, 7.5), (-0.4997558, 7.984375))
        make_face()
        Circle(SKETCH1_R, mode=Mode.SUBTRACT)
    extrude(amount=BOSS_EXTRUDE1_DEPTH)


solid = part.part
